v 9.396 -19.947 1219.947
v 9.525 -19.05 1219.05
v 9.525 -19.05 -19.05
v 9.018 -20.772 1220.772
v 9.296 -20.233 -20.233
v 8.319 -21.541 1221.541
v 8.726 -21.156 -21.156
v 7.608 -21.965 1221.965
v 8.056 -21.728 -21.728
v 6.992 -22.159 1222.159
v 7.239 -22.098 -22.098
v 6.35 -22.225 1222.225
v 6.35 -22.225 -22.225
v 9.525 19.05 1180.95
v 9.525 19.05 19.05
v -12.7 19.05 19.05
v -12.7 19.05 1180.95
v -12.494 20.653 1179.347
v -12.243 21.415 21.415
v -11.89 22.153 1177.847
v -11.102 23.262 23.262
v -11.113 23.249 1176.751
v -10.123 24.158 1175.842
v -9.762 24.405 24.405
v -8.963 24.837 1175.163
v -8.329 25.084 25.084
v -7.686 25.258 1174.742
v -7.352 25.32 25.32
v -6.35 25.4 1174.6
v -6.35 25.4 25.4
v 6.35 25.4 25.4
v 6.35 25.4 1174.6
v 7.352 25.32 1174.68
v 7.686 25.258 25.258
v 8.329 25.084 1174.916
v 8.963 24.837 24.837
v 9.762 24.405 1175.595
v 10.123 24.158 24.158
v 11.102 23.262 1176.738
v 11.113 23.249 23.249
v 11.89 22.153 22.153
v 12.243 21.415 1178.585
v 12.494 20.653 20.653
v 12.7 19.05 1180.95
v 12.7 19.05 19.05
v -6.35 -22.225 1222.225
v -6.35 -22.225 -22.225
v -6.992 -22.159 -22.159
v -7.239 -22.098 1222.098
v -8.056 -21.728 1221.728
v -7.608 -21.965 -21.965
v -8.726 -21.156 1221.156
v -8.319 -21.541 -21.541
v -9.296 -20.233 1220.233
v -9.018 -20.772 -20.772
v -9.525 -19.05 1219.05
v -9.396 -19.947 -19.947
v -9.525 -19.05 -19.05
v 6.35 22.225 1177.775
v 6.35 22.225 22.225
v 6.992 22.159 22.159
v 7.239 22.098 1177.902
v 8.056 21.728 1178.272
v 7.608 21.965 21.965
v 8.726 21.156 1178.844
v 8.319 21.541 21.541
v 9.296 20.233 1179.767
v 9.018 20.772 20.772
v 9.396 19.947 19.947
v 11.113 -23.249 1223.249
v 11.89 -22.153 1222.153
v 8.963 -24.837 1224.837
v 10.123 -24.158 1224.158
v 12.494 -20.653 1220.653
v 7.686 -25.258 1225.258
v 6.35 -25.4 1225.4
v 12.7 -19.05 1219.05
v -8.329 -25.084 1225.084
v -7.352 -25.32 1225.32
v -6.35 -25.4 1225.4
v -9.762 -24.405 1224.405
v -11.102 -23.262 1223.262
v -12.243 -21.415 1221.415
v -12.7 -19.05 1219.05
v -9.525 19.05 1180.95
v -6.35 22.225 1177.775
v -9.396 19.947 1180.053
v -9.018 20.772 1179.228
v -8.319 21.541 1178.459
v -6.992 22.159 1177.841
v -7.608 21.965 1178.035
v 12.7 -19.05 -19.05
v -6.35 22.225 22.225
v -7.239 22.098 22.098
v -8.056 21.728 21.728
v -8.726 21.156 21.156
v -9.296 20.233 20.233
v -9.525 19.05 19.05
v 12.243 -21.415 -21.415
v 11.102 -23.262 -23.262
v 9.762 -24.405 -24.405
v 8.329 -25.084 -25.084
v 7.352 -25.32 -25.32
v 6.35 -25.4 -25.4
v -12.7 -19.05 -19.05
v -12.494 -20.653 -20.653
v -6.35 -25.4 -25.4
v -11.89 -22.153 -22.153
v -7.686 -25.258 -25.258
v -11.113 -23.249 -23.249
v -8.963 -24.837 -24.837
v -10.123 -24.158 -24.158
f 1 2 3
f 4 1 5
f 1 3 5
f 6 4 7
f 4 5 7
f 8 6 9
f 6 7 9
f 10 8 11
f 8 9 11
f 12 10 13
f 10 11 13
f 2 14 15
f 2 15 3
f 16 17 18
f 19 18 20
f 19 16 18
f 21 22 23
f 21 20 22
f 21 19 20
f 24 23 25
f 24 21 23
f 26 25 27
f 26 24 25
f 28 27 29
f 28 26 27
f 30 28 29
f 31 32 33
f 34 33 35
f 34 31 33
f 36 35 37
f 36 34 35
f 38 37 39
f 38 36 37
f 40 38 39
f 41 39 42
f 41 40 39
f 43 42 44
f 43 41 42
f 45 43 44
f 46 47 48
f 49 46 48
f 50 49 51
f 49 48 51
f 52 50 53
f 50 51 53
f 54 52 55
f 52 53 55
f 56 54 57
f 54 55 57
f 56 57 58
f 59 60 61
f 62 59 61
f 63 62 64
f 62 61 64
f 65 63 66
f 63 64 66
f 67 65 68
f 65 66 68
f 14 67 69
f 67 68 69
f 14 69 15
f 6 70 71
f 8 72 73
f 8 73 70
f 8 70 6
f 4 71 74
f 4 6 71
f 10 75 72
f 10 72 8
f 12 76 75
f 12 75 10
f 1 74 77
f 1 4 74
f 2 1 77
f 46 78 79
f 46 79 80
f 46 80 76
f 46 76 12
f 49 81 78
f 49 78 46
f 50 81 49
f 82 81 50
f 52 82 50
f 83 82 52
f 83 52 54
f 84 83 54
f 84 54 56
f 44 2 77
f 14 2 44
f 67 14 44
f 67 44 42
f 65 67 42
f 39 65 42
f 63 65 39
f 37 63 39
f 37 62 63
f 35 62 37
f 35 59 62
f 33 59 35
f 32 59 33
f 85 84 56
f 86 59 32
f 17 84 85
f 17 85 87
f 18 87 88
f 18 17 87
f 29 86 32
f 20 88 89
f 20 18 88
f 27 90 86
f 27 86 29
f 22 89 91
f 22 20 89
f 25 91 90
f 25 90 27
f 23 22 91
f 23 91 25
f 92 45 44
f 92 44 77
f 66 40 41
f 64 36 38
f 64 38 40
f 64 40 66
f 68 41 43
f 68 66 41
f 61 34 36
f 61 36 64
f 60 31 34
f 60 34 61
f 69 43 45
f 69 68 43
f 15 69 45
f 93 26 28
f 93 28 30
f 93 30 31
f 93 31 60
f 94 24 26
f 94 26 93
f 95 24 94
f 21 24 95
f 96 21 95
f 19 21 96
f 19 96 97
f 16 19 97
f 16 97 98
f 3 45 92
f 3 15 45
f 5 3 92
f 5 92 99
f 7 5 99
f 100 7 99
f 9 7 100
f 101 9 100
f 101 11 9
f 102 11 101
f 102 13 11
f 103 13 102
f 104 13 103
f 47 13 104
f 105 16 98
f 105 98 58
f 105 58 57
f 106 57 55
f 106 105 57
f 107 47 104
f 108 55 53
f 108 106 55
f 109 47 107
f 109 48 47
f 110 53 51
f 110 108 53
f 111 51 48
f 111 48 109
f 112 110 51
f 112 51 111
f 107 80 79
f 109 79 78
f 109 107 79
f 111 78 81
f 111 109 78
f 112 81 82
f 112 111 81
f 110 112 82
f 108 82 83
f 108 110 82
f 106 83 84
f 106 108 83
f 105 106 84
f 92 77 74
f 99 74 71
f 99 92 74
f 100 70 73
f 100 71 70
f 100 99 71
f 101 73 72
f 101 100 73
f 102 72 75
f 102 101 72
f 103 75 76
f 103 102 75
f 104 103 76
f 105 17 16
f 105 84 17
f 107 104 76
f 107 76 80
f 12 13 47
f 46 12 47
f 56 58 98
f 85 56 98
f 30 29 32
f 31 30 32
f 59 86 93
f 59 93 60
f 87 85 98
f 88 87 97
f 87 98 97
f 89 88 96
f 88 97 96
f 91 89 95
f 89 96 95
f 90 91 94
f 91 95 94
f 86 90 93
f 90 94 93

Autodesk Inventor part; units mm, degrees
ref_plane "Start Plane" through (0, 0, -25.4) normal (0, 0, 1) x (1, 0, 0)
ref_plane "End Plane" through (0, 0, 1225.4) normal (0, 0, 1) x (1, 0, 0)
sketch "Sketch" plane through (0, 0, 0) normal (0, 0, 1) x (1, 0, 0)
  line L0 (-12.7, -19.05) -> (-12.7, 19.05)
  line L1 (-6.35, 25.4) -> (6.35, 25.4)
  line L2 (12.7, 19.05) -> (12.7, -19.05)
  line L3 (6.35, -25.4) -> (-6.35, -25.4)
  arc A0 (-12.7, -19.05) -> (-6.35, -25.4) centre (-6.35, -19.05) ccw
  arc A1 (-6.35, 25.4) -> (-12.7, 19.05) centre (-6.35, 19.05) ccw
  arc A2 (12.7, 19.05) -> (6.35, 25.4) centre (6.35, 19.05) ccw
  arc A3 (6.35, -25.4) -> (12.7, -19.05) centre (6.35, -19.05) ccw
  arc A4 (-6.35, 22.225) -> (-9.525, 19.05) centre (-6.35, 19.05) ccw
  line L4 (-6.35, 22.225) -> (6.35, 22.225)
  arc A5 (9.525, 19.05) -> (6.35, 22.225) centre (6.35, 19.05) ccw
  line L5 (9.525, 19.05) -> (9.525, -19.05)
  arc A6 (6.35, -22.225) -> (9.525, -19.05) centre (6.35, -19.05) ccw
  line L6 (6.35, -22.225) -> (-6.35, -22.225)
  arc A7 (-9.525, -19.05) -> (-6.35, -22.225) centre (-6.35, -19.05) ccw
  line L7 (-9.525, -19.05) -> (-9.525, 19.05)
  line L8 (0, 37.4012) -> (0, -37.4012) construction
  line L9 (-19.6212, 0) -> (19.6212, 0) construction
  dimension "d10" = 50.8
  dimension "d11" = 25.4
  dimension "d12" = 3.175
  dimension "d15" = 25.4
  dimension "d16" = 12.7
  dimension "d17" = 6.35
extrude "Body" add sketch "Sketch" along normal up to surface (1250.8 mm away) from surface at -25.4
sketch "Sketch3" plane through (0, 0, 0) normal (0, 0, 1) x (1, 0, 0)
  line L0 (0, 0) -> (10, 0)
ref_plane "Work Plane3" through (0, 0, 0) normal (0, -1, 0) x (1, 0, 0)
ref_plane "Work Plane4" through (0, -25.4, 1225.4) normal (0, 0.7071, 0.7071) x (1, 0, 0)
split "Split1" plane through (0, -25.4, 1225.4) removes the side toward (0, 0.7071, 0.7071)
ref_plane "Work Plane5" through (0, 0, 0) normal (0, 0.7071, -0.7071) x (1, 0, 0)
split "Split2" plane through (0, 0, 0) removes the side toward (0, 0.7071, -0.7071)
sketch "Sketch4" plane through (0, 0, 0) normal (0, -1, 0) x (1, 0, 0)
  line L0 (-2, -25.4) -> (12, -25.4) projected
  line L1 (-2, 1225.4) -> (12, 1225.4) projected
  dimension "d19" = 1250.8
equation "\"d10\" = G_H"
equation "\"d11\" = G_W"
equation "\"d12\" = G_T"
equation "\"d15\" = 0.5 * d10"
equation "\"d16\" = 0.5 * d11"
equation "\"d17\" = G_IR"
equation "\"d3\" = G_L"
equation "\"G_W\" = 25.4"
equation "\"G_H\" = 50.8"
equation "\"G_T\" = 3.175"
equation "\"G_IR\" = 6.35"
equation "\"G_L\" = d19"
equation "\"G_OFFSET_START\" = 25.4"
equation "\"G_OFFSET_END\" = 25.4"
equation "\"d13\" = -G_OFFSET_START"
equation "\"d14\" = G_OFFSET_END + B_L"
equation "\"B_L\" = 1200"
properties part number "AISC - 2 x 1 x 1/8 - 49.244" material "Steel, Wrought"
